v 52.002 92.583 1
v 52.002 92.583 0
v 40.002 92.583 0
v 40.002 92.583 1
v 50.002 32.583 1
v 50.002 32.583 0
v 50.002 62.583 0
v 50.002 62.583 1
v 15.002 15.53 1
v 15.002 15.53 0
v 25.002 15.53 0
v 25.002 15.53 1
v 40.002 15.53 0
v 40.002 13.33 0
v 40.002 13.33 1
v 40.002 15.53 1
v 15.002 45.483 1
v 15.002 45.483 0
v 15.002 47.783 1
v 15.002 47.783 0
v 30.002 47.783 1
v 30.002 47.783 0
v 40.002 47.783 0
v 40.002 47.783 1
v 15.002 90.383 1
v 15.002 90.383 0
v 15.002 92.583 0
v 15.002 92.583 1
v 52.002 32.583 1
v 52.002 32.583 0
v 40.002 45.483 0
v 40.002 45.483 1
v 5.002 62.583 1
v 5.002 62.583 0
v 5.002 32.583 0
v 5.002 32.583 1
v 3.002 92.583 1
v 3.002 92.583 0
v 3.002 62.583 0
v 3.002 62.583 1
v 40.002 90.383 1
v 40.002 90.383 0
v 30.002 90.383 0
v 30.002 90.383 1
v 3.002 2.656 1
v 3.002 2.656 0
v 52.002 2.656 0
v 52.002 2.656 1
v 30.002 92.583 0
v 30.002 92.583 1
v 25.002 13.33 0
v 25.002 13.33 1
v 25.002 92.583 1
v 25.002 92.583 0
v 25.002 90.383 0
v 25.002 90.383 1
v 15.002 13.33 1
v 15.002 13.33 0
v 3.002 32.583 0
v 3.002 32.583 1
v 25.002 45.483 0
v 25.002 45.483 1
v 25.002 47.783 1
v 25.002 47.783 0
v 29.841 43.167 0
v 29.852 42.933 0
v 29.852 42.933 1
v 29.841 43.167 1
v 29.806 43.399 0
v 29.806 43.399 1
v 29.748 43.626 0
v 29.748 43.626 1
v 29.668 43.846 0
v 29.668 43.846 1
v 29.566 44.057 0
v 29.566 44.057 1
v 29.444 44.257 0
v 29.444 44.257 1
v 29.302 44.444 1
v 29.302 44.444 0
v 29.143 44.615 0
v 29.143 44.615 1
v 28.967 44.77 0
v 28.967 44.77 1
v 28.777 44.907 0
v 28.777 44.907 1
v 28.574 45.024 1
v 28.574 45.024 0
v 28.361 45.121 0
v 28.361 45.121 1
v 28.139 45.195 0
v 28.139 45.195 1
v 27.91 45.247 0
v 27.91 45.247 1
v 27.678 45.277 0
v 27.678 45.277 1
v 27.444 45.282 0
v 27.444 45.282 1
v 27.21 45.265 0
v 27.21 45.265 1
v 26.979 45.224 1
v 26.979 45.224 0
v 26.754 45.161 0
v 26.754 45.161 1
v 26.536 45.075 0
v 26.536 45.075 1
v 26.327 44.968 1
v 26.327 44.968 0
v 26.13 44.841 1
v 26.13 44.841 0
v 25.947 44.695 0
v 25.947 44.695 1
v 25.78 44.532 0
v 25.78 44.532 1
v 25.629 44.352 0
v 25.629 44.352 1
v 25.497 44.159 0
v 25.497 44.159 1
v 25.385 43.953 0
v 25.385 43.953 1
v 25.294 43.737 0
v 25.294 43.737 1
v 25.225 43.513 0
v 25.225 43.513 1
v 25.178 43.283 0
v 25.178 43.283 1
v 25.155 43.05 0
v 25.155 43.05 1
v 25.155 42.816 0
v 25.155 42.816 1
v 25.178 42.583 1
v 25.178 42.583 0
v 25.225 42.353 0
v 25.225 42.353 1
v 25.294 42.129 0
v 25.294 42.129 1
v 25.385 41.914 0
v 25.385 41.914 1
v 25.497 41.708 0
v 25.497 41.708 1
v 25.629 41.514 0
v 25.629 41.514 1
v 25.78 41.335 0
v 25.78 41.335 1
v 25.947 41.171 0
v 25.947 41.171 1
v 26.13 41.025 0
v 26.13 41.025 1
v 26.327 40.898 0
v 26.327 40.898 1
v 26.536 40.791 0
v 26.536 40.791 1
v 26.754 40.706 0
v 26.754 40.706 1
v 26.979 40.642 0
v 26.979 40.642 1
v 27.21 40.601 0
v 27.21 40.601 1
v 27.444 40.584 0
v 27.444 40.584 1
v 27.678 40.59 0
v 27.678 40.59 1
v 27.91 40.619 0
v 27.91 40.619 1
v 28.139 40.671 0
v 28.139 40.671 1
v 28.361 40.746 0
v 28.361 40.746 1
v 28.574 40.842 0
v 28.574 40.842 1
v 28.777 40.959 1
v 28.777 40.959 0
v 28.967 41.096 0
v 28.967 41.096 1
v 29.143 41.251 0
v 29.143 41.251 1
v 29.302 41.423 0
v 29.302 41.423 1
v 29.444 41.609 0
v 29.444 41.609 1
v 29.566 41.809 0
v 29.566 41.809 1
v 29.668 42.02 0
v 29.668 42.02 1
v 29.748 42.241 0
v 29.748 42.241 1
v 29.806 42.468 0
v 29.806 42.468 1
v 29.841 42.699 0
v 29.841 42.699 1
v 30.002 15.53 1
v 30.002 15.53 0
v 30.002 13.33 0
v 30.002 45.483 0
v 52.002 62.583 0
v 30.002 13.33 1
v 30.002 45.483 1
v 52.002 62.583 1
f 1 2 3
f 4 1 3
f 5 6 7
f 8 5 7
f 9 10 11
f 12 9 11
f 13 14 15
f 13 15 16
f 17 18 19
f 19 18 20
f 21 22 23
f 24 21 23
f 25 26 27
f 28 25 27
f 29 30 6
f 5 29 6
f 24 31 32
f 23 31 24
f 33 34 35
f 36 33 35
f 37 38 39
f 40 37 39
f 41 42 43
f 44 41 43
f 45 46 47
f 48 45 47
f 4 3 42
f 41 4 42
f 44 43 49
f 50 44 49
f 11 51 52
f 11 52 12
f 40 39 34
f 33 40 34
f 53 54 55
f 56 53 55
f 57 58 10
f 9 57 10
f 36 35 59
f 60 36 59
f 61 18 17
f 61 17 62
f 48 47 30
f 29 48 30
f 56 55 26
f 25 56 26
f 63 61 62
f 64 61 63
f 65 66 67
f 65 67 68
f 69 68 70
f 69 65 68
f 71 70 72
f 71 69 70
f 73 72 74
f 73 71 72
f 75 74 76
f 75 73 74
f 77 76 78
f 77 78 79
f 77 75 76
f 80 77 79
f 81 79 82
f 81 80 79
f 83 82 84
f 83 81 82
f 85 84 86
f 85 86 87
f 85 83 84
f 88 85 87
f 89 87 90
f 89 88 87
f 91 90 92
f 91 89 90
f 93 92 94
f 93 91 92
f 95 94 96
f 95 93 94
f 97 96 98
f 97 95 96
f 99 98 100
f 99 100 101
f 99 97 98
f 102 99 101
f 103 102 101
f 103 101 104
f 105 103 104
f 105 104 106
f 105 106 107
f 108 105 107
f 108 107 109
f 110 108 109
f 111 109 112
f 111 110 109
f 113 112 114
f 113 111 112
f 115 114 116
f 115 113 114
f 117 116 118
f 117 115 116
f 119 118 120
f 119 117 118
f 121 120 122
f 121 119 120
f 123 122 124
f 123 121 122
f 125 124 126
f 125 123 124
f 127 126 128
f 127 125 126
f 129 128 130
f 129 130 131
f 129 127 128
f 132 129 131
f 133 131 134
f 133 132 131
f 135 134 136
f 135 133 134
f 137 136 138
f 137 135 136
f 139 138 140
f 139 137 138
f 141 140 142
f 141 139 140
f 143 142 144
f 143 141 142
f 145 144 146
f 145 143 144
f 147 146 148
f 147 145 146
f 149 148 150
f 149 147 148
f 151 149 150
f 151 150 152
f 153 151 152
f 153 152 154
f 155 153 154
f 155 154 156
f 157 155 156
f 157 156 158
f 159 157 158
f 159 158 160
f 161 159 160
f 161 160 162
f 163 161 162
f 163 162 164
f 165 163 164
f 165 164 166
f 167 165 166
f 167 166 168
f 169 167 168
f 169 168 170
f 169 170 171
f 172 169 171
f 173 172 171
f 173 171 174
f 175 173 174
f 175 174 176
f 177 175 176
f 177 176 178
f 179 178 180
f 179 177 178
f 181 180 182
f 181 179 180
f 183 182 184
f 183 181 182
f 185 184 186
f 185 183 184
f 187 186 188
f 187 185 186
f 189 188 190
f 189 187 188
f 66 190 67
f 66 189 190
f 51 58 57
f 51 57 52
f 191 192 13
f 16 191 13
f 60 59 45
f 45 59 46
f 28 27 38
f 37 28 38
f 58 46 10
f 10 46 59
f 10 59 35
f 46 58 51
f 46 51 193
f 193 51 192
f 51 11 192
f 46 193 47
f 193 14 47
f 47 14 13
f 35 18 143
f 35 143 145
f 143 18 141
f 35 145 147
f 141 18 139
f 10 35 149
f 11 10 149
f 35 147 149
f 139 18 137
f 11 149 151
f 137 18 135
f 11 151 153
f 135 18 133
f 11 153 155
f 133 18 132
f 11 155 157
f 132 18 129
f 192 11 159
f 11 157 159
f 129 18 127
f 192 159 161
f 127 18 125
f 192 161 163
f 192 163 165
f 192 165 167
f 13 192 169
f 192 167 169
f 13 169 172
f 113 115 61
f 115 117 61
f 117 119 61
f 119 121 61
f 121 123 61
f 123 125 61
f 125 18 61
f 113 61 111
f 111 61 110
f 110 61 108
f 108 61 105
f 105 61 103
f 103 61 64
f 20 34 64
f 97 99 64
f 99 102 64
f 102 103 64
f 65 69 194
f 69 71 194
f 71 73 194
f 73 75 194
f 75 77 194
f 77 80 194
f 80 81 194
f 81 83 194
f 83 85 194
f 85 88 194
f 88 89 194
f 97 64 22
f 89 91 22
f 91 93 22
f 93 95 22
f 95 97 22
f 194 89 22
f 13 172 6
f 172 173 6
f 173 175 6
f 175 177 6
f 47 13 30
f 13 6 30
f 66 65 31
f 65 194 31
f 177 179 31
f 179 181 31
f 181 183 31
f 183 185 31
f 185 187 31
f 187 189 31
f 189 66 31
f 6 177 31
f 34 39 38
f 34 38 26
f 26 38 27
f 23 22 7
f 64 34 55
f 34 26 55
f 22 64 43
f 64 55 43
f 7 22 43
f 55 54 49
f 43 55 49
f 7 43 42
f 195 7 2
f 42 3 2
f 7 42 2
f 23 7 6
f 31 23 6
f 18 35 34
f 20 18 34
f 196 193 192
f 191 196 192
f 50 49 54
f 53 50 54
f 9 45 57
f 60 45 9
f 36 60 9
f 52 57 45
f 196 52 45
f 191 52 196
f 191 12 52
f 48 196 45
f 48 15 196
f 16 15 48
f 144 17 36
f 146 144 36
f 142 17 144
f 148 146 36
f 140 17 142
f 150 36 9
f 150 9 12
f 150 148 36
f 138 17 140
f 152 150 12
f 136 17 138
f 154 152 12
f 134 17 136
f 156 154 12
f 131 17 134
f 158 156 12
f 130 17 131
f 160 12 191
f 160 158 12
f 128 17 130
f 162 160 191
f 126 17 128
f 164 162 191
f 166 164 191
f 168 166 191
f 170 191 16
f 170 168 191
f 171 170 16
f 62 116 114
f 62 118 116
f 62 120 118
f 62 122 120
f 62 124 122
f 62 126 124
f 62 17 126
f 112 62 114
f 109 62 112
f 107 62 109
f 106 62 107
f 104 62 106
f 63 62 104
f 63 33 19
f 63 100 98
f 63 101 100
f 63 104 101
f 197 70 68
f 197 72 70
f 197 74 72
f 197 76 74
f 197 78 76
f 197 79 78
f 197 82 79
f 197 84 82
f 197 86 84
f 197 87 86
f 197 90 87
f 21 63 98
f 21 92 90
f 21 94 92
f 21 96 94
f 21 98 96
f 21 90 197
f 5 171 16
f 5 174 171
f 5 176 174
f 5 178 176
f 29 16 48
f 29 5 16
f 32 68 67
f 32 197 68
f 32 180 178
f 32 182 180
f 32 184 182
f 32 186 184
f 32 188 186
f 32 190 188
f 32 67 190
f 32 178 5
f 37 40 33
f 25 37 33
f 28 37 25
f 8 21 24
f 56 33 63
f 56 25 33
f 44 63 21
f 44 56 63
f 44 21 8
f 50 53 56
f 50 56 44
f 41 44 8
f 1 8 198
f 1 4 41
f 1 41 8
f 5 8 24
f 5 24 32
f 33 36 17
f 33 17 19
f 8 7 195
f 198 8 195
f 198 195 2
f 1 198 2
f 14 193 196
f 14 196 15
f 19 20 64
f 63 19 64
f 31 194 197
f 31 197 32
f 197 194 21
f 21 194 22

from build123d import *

# Parameters (mm, degrees)
MODEL_R         = 2.35
MODEL_W         = 10
MODEL_H         = 2.3
MODEL_H_2       = 2.20013503
EXTRUDE_1_DEPTH = 1


with BuildPart() as part:
    # Model → 凸台-拉伸1 (new body)
    with BuildSketch(Plane.XY):
        Polygon((3.002178354, 2.656404454), (33.252178354, 2.656404454), (52.002178354, 2.656404454), (52.002178354, 32.582558285), (50.002178354, 32.582558285), (50.002178354, 62.582558285), (52.002178354, 62.582558285), (52.002178354, 92.582558285), (40.002178354, 92.582558285), (40.002178354, 90.382558285), (30.002178354, 90.382558285), (30.002178354, 92.582558285), (25.002178354, 92.582558285), (25.002178354, 90.382558285), (15.002178354, 90.382558285), (15.002178354, 92.582558285), (3.002178354, 92.582558285), (3.002178354, 62.582558285), (5.002178354, 62.582558285), (5.002178354, 32.582558285), (3.002178354, 32.582558285), align=None)
        with Locations((27.502178354, 42.933185696)):
            Circle(MODEL_R, mode=Mode.SUBTRACT)
        with Locations((20.002178354, 46.632557075)):
            Rectangle(MODEL_W, MODEL_H, mode=Mode.SUBTRACT)
        with Locations((20.002178354, 14.429981905)):
            Rectangle(MODEL_W, MODEL_H_2, mode=Mode.SUBTRACT)
        with Locations((35.002178354, 14.429981905)):
            Rectangle(MODEL_W, MODEL_H_2, mode=Mode.SUBTRACT)
        with Locations((35.002178354, 46.632557075)):
            Rectangle(MODEL_W, MODEL_H, mode=Mode.SUBTRACT)
    extrude(amount=EXTRUDE_1_DEPTH)


solid = part.part
